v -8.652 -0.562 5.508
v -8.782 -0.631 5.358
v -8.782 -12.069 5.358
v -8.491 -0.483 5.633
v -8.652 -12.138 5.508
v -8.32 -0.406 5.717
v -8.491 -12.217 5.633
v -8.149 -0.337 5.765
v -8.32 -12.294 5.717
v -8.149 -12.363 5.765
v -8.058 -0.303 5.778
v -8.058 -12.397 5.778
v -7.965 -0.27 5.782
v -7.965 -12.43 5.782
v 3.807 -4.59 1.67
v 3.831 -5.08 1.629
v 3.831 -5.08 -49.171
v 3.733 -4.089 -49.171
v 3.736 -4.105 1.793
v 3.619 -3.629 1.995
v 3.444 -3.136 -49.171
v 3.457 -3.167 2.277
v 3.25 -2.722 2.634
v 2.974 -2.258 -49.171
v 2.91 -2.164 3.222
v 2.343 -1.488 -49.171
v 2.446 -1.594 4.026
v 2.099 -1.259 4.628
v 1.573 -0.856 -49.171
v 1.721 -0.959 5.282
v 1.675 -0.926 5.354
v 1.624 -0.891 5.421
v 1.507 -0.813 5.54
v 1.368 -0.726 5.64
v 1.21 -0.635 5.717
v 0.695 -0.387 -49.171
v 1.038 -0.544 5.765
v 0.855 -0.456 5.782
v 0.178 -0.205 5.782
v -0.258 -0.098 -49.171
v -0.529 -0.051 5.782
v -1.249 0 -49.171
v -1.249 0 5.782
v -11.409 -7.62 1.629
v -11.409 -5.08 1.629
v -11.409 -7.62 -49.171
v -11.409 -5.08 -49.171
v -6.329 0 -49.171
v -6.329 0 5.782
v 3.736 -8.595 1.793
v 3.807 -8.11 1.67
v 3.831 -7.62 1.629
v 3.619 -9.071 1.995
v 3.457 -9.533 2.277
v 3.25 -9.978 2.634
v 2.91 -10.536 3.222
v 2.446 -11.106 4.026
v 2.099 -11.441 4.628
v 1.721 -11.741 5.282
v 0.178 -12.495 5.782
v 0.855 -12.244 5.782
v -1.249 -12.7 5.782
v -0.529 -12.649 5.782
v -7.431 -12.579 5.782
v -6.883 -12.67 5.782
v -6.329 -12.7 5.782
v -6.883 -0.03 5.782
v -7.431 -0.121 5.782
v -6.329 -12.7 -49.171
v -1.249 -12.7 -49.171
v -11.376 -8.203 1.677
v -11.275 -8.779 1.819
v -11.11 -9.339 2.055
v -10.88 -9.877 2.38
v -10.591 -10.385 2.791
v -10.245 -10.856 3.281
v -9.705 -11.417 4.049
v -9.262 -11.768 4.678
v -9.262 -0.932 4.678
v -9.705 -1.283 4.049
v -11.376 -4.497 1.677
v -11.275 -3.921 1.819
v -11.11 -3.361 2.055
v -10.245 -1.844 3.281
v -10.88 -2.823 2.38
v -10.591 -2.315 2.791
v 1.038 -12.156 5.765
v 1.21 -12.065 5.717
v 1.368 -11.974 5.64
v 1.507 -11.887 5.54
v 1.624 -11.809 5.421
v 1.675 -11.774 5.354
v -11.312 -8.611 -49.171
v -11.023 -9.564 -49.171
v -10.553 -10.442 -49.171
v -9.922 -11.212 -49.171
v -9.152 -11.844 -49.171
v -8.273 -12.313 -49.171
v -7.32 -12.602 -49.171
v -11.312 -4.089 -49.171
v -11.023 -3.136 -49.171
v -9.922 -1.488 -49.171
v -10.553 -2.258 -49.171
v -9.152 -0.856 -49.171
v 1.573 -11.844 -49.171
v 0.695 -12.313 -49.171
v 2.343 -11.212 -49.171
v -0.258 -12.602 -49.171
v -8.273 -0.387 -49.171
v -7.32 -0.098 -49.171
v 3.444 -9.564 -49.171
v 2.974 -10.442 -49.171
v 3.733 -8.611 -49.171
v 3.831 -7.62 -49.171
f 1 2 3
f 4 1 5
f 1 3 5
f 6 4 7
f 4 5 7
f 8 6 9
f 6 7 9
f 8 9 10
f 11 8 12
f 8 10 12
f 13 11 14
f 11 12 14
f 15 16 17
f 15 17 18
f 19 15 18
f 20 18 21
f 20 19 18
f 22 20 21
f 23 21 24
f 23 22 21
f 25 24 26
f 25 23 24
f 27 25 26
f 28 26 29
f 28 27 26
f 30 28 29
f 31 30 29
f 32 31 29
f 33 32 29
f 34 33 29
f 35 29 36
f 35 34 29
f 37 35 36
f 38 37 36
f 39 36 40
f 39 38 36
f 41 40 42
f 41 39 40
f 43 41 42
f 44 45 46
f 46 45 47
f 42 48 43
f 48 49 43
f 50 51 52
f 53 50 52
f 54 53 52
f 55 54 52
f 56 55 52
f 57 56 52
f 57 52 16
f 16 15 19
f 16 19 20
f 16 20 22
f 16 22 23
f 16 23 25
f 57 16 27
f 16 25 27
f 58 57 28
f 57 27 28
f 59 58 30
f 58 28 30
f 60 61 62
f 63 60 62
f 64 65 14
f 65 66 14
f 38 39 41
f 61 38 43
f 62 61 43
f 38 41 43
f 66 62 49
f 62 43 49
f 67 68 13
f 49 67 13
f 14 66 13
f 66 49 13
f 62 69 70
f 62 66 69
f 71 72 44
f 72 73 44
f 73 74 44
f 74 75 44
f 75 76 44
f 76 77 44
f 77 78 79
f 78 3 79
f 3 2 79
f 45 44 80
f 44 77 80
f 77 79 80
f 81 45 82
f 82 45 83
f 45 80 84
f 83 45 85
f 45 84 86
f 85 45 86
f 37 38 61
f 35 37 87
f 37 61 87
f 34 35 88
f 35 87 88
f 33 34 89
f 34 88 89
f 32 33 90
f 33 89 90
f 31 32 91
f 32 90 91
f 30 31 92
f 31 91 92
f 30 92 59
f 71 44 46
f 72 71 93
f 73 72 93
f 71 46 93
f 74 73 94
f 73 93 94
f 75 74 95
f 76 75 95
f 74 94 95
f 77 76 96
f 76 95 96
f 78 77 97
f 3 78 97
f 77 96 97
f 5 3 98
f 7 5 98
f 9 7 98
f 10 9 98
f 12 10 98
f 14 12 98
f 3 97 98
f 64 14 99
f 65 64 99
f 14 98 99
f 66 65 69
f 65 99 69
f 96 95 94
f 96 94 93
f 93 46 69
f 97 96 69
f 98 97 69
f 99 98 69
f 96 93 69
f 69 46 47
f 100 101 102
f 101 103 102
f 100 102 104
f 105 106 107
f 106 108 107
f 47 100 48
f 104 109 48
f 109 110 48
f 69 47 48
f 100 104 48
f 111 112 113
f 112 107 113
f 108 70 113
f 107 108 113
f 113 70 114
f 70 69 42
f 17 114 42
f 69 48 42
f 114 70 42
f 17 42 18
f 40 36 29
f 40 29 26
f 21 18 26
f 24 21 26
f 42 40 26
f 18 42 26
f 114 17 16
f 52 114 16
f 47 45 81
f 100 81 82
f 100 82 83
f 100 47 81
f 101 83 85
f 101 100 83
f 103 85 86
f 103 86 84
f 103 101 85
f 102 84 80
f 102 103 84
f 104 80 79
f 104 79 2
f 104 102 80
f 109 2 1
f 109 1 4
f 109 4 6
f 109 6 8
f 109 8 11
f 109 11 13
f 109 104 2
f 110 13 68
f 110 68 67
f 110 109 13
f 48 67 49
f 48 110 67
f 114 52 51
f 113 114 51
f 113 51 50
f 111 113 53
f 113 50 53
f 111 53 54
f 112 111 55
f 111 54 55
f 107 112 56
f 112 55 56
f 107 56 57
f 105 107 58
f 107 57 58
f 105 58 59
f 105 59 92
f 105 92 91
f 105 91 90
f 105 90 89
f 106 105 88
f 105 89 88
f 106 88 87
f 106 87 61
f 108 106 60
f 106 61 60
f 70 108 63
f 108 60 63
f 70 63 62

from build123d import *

# Parameters (mm, degrees)
F1_DEPTH = 12.7
F2_R     = 5.08
F3_R     = 1


with BuildPart() as f1:
    # F0 (on Front) → F1 (new body)
    with BuildSketch(Plane.XZ):
        Polygon((-11.409408, 1.629178), (-11.409408, -49.170822), (3.830592, -49.170822), (3.830592, 1.629178), (1.432159, 5.782014), (0, 5.782014), (-8.4836, 5.782014), align=None)
    extrude(amount=F1_DEPTH)

    # F2
    f2_edges = [f1.edges().sort_by_distance(p)[0] for p in [
        (-11.409408, 0, -23.770822),
        (-11.409408, -12.7, -23.770822),
        (3.830592, -12.7, -23.770822),
        (3.830592, 0, -23.770822),
    ]]
    fillet(f2_edges, radius=F2_R)

    # F3
    f3_edges = [f1.edges().sort_by_distance(p)[0] for p in [
        (1.432159, -6.35, 5.782014),
        (-8.4836, -6.35, 5.782014),
    ]]
    fillet(f3_edges, radius=F3_R)


solid = f1.part
